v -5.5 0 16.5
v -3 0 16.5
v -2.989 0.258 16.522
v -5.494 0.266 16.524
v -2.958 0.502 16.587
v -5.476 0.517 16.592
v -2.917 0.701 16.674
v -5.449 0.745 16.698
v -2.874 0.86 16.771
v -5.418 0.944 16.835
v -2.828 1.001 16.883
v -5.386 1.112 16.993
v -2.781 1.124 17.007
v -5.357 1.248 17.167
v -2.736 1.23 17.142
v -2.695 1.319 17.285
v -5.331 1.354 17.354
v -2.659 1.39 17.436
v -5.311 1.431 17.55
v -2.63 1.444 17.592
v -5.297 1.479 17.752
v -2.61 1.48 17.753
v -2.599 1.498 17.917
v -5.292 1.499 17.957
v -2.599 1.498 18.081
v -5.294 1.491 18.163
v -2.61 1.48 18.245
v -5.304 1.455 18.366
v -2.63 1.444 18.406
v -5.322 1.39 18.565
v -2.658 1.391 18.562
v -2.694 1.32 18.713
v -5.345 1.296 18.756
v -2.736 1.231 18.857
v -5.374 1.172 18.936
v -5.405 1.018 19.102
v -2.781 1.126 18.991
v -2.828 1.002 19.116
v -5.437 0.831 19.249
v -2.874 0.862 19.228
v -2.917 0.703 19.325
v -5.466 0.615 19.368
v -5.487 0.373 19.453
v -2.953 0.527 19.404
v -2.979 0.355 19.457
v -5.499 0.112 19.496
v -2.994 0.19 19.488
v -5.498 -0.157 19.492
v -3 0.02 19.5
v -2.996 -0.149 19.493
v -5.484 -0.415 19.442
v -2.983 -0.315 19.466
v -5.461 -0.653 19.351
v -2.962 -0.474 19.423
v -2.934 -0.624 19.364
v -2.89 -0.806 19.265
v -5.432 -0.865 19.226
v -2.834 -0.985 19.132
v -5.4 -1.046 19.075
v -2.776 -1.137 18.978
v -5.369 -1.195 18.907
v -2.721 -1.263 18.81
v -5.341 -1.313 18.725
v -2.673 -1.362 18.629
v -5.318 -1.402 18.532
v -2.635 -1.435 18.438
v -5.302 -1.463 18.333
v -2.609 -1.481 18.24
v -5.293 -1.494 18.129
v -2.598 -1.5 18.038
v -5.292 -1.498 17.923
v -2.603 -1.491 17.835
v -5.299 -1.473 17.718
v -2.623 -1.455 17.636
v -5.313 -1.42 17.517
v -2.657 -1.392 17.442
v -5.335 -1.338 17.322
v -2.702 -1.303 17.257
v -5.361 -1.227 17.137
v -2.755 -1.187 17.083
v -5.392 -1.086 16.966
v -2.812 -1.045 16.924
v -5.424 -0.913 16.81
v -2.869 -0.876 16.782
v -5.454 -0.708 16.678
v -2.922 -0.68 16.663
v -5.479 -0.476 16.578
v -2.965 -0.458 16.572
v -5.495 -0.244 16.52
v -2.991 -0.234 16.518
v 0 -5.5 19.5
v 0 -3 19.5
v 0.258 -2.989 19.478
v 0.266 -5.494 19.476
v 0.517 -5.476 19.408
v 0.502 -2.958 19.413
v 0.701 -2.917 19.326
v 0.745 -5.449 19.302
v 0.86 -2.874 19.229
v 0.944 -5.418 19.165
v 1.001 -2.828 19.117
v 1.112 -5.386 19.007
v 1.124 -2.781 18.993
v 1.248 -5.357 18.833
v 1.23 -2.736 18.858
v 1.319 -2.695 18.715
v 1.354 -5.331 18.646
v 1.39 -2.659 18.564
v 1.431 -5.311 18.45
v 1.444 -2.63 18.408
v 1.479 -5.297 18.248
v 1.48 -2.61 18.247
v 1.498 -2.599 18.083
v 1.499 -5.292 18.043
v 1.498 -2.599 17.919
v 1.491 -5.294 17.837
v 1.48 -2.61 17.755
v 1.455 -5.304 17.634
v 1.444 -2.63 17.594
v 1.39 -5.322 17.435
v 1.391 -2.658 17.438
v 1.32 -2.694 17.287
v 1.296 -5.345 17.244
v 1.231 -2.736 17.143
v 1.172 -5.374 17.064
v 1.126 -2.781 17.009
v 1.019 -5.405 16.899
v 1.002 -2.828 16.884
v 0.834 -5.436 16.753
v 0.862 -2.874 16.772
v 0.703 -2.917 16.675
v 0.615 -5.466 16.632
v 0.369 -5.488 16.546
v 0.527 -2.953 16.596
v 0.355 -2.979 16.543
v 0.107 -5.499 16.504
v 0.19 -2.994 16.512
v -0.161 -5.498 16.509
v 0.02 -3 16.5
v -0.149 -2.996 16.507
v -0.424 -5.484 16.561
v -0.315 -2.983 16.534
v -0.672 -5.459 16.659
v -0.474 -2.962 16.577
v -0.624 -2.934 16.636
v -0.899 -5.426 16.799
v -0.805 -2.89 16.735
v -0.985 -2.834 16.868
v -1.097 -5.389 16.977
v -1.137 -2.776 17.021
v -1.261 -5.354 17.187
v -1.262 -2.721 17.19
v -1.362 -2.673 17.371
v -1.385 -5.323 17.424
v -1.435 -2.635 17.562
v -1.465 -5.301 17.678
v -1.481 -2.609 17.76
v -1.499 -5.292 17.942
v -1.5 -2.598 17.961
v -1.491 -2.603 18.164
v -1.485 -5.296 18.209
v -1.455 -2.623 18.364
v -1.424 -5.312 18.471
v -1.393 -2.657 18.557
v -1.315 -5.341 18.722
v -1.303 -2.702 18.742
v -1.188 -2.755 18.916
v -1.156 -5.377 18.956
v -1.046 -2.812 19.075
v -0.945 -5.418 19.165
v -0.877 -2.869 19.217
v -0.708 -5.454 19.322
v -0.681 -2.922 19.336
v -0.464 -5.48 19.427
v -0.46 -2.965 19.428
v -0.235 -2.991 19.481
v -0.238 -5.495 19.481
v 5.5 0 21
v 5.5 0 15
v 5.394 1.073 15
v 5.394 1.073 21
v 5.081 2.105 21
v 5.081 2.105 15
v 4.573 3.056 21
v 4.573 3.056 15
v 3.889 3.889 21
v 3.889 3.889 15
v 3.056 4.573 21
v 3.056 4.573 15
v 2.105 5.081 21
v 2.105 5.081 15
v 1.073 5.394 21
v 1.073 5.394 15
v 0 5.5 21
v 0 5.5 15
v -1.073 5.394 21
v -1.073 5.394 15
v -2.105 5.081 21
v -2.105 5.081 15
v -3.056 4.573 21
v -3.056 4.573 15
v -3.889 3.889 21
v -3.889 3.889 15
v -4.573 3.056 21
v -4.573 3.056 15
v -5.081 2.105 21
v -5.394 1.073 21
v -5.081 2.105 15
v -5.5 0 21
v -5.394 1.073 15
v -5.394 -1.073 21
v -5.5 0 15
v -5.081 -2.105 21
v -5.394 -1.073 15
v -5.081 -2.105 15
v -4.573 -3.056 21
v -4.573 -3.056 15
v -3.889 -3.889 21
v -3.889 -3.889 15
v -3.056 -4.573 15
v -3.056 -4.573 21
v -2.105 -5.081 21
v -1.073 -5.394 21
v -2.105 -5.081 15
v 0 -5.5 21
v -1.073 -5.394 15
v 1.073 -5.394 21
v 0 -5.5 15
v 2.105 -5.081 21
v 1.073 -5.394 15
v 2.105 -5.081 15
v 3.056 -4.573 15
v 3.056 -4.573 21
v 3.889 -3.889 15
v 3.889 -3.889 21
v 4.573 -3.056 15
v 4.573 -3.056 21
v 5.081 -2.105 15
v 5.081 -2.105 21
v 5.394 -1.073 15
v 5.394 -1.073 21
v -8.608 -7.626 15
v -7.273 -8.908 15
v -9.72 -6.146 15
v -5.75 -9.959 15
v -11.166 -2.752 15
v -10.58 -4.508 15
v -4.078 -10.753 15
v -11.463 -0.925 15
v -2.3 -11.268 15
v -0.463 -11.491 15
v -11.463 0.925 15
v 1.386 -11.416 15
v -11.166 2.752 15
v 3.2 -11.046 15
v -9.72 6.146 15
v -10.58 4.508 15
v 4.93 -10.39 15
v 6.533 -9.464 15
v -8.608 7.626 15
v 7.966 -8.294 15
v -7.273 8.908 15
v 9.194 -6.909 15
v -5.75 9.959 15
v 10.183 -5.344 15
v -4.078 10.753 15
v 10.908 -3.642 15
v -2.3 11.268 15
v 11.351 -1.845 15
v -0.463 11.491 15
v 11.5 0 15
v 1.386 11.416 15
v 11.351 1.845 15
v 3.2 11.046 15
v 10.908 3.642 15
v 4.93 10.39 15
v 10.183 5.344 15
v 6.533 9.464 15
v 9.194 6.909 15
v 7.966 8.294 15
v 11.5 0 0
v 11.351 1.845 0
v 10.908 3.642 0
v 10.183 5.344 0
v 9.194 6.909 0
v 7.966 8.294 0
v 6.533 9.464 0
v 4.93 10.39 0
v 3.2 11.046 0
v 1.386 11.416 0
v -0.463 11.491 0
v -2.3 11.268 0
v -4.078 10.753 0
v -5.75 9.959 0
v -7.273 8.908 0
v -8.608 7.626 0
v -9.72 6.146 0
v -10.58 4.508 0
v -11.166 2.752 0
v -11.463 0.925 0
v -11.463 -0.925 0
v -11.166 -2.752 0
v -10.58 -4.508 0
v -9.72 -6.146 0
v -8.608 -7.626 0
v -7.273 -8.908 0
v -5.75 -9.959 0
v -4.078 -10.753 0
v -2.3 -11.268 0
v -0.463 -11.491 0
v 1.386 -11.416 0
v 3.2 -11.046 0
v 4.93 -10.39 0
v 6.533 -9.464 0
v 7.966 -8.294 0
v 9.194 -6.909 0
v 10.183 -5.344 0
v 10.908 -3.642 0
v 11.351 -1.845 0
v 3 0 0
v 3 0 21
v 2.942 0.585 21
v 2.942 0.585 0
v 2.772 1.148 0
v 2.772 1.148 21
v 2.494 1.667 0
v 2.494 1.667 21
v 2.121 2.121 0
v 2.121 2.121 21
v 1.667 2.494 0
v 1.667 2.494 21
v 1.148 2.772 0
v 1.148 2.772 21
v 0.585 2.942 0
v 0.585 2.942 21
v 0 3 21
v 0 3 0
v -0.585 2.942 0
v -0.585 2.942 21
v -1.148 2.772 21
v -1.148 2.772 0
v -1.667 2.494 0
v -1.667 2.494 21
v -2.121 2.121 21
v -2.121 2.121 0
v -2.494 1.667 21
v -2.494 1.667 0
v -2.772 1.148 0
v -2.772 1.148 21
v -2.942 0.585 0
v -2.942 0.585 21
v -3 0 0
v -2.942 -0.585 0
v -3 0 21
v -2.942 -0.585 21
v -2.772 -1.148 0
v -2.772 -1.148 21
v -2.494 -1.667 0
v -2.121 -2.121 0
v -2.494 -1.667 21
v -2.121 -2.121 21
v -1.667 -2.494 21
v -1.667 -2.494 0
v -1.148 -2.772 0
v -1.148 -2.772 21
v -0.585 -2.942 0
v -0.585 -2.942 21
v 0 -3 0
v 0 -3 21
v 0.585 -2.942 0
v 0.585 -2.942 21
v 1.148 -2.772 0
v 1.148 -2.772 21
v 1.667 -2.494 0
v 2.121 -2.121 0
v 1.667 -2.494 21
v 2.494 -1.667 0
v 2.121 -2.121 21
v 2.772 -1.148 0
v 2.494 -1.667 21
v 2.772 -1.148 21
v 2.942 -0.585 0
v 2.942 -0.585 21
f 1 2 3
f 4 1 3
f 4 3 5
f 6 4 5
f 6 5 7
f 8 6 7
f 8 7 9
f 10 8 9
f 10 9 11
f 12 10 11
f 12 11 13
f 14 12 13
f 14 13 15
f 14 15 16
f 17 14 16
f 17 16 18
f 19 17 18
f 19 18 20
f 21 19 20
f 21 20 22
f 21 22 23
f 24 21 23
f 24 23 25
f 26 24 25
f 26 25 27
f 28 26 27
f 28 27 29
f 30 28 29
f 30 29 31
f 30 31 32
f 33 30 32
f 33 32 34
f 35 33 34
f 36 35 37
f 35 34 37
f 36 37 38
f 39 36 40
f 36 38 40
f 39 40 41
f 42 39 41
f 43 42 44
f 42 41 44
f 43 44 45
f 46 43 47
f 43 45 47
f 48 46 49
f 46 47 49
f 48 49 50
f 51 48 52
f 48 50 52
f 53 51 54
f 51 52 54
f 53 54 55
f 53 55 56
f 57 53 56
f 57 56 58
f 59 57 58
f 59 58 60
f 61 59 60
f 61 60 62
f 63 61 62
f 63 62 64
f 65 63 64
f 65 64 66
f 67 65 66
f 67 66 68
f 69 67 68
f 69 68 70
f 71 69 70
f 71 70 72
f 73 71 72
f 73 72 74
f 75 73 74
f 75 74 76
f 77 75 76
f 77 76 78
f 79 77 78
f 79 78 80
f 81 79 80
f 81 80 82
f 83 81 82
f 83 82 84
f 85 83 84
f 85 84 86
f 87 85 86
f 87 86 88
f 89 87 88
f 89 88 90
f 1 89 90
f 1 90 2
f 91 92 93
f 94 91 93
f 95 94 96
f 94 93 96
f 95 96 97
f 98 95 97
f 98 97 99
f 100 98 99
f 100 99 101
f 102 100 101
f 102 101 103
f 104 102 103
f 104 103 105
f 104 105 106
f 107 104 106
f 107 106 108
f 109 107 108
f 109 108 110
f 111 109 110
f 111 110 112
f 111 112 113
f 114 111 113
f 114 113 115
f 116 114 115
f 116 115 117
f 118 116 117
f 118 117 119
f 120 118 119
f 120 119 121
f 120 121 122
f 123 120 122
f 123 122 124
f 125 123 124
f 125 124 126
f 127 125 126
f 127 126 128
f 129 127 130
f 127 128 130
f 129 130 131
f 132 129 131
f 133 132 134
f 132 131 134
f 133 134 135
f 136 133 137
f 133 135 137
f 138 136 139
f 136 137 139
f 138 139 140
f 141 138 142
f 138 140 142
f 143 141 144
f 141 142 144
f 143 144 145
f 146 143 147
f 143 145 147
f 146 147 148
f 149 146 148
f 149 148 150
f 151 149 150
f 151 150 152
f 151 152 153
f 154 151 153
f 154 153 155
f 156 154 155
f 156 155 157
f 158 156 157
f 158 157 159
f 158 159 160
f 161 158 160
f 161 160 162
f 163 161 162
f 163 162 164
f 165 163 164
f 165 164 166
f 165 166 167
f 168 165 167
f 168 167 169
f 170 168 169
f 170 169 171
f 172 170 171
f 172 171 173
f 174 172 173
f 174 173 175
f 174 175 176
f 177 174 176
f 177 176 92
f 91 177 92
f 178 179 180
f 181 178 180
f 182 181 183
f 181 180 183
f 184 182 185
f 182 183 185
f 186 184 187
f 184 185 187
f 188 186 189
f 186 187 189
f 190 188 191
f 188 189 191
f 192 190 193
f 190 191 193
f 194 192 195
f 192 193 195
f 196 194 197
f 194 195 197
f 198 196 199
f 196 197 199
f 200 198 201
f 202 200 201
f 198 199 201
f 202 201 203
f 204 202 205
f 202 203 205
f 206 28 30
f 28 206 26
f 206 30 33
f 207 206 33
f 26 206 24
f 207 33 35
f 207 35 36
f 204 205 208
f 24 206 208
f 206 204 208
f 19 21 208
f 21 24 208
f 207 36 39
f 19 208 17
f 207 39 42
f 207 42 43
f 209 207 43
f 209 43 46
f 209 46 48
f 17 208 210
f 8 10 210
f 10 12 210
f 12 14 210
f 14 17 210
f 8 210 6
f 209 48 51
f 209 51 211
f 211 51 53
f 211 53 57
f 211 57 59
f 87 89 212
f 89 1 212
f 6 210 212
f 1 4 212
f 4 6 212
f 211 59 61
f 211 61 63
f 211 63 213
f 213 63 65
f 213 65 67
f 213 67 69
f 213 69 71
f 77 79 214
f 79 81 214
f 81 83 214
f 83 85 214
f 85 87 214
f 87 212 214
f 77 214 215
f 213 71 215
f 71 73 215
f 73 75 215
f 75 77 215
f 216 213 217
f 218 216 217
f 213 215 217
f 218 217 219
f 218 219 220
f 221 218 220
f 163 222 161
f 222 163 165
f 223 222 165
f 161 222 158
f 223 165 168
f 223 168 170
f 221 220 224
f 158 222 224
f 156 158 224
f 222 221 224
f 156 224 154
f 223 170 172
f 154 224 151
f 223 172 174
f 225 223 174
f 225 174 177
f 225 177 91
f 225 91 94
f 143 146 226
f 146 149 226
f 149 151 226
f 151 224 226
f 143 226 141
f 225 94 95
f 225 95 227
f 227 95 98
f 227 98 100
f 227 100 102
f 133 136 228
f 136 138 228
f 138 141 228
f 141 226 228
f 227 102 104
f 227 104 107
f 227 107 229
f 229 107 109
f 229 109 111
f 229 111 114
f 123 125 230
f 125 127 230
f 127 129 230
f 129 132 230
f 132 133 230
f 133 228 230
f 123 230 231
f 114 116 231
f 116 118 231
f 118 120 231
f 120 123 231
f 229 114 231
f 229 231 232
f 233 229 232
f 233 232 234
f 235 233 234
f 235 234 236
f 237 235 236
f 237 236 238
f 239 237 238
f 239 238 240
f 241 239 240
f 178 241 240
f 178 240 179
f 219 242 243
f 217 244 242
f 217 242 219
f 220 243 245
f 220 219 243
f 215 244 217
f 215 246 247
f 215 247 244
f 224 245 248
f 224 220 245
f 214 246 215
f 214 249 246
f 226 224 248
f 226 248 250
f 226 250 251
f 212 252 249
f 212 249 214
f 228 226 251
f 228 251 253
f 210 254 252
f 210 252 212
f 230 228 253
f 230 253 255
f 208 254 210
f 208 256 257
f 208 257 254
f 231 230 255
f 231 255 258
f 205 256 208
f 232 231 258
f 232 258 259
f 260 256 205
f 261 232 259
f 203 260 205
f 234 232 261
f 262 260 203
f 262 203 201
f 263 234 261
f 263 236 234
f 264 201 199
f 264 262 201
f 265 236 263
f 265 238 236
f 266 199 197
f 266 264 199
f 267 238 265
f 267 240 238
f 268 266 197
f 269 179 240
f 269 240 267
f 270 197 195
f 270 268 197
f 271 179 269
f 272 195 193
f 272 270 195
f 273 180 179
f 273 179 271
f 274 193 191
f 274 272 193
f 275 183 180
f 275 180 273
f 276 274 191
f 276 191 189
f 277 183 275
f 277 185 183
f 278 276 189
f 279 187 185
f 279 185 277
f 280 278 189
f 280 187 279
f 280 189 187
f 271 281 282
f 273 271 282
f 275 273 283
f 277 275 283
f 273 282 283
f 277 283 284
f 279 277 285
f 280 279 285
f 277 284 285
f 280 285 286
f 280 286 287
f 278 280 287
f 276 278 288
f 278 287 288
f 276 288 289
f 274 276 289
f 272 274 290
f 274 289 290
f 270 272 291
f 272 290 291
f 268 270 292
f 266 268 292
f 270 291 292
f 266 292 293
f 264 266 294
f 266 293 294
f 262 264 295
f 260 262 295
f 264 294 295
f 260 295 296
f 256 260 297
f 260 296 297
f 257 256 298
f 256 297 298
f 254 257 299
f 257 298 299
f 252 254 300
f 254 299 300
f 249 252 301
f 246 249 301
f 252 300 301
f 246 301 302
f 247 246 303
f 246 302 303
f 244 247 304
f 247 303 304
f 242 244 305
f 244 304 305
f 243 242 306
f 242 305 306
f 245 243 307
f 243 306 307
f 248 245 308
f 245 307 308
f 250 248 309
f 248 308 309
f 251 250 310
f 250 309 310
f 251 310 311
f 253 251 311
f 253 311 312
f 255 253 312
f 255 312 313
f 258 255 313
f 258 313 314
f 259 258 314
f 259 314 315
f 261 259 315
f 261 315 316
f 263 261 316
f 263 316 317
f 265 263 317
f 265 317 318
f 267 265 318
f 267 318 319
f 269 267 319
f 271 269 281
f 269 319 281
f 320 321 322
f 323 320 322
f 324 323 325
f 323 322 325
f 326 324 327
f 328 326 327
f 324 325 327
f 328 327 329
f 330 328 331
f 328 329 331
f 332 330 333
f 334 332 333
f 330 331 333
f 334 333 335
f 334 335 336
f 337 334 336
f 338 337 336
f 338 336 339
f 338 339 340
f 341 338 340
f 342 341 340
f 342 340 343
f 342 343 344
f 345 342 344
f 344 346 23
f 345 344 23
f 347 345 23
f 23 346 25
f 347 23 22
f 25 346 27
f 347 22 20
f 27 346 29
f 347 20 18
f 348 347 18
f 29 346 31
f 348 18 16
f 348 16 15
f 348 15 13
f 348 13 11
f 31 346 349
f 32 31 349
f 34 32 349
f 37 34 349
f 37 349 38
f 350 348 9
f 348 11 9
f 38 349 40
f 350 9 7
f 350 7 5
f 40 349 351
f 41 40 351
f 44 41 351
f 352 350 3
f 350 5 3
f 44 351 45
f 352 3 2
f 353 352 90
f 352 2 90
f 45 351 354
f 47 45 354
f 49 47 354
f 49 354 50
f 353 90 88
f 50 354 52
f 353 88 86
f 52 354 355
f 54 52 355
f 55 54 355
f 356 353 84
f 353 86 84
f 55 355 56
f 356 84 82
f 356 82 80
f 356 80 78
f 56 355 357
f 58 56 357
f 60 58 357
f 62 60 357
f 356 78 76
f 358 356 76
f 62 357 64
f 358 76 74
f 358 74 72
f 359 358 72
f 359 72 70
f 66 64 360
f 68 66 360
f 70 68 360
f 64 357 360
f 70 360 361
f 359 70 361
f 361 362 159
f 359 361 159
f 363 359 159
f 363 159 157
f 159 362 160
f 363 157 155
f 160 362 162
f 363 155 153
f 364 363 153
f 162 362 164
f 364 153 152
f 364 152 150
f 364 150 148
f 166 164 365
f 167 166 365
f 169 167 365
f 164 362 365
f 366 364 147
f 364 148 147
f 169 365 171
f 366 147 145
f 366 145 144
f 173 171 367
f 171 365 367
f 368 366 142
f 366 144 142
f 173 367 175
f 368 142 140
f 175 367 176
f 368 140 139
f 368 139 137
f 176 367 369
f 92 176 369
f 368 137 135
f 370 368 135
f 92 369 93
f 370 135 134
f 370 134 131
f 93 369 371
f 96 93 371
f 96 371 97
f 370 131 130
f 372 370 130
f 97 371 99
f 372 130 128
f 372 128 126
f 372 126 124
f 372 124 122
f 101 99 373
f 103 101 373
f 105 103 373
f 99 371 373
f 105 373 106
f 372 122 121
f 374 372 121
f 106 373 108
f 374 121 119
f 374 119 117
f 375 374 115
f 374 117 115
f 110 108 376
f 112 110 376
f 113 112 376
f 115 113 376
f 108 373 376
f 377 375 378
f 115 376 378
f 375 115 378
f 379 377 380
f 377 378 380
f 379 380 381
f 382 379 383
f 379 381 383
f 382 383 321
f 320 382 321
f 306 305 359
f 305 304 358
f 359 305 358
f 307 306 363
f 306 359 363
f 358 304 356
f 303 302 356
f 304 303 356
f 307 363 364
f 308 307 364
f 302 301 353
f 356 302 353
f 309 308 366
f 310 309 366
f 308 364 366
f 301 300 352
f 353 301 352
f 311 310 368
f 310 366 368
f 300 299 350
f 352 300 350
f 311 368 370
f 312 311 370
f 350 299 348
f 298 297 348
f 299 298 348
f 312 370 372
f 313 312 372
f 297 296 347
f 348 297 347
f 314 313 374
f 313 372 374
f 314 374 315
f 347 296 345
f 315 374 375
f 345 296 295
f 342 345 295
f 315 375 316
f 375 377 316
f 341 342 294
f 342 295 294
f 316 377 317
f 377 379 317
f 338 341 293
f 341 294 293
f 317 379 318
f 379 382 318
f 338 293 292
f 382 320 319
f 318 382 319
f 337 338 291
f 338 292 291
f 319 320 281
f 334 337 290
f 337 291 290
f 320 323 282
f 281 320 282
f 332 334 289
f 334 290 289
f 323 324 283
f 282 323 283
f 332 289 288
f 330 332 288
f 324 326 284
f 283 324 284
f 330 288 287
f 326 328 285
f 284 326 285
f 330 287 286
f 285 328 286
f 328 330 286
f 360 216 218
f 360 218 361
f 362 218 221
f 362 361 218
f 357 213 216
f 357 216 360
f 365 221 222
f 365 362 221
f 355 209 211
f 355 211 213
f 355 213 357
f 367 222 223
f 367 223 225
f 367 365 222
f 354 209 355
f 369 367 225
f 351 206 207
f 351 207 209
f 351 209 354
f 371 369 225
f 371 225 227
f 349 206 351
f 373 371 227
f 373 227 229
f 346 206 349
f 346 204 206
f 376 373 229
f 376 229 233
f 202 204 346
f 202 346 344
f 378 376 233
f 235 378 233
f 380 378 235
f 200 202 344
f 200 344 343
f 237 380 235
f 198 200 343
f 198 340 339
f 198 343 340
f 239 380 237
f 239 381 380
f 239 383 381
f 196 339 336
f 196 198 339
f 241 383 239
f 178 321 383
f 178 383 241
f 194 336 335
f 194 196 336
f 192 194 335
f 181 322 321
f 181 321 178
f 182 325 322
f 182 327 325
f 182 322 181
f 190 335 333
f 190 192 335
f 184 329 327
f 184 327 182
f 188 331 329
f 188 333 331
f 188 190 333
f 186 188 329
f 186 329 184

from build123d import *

# Parameters (mm, degrees)
SKETCH1_R           = 11.5
BOSS_EXTRUDE1_DEPTH = 15
SKETCH2_R           = 5.5
BOSS_EXTRUDE2_DEPTH = 6
SKETCH3_R           = 3
CUT_EXTRUDE1_DEPTH  = 27.561249971
SKETCH4_R           = 1.5
CUT_EXTRUDE2_DEPTH  = 27.561249971
SKETCH5_R           = 1.5
CUT_EXTRUDE3_DEPTH  = 27.56125005


with BuildPart() as part:
    # Sketch1 → Boss-Extrude1 (new body)
    with BuildSketch(Plane.XY):
        Circle(SKETCH1_R)
    extrude(amount=BOSS_EXTRUDE1_DEPTH)

    # Sketch2 → Boss-Extrude2 (add)
    with BuildSketch(Plane.XY.offset(15)):
        Circle(SKETCH2_R)
    extrude(amount=BOSS_EXTRUDE2_DEPTH)

    # Sketch3 → Cut-Extrude1 (cut, through all)
    with BuildSketch(Plane.XY.offset(21)):
        Circle(SKETCH3_R)
    extrude(amount=-CUT_EXTRUDE1_DEPTH, mode=Mode.SUBTRACT)

    # Sketch4 → Cut-Extrude2 (cut, through all)
    with BuildSketch(Plane(origin=(0, 0, 0), x_dir=(1, 0, 0), z_dir=(0, 1, 0))):
        with Locations(Location((0, -18, 0), (0, 0, 270))):
            Circle(SKETCH4_R)
    extrude(amount=-CUT_EXTRUDE2_DEPTH, mode=Mode.SUBTRACT)

    # Sketch5 → Cut-Extrude3 (cut, through all)
    with BuildSketch(Plane(origin=(0, 0, 0), x_dir=(0, 0, -1), z_dir=(1, 0, 0))):
        with Locations((-18, 0)):
            Circle(SKETCH5_R)
    extrude(amount=-CUT_EXTRUDE3_DEPTH, mode=Mode.SUBTRACT)


solid = part.part
